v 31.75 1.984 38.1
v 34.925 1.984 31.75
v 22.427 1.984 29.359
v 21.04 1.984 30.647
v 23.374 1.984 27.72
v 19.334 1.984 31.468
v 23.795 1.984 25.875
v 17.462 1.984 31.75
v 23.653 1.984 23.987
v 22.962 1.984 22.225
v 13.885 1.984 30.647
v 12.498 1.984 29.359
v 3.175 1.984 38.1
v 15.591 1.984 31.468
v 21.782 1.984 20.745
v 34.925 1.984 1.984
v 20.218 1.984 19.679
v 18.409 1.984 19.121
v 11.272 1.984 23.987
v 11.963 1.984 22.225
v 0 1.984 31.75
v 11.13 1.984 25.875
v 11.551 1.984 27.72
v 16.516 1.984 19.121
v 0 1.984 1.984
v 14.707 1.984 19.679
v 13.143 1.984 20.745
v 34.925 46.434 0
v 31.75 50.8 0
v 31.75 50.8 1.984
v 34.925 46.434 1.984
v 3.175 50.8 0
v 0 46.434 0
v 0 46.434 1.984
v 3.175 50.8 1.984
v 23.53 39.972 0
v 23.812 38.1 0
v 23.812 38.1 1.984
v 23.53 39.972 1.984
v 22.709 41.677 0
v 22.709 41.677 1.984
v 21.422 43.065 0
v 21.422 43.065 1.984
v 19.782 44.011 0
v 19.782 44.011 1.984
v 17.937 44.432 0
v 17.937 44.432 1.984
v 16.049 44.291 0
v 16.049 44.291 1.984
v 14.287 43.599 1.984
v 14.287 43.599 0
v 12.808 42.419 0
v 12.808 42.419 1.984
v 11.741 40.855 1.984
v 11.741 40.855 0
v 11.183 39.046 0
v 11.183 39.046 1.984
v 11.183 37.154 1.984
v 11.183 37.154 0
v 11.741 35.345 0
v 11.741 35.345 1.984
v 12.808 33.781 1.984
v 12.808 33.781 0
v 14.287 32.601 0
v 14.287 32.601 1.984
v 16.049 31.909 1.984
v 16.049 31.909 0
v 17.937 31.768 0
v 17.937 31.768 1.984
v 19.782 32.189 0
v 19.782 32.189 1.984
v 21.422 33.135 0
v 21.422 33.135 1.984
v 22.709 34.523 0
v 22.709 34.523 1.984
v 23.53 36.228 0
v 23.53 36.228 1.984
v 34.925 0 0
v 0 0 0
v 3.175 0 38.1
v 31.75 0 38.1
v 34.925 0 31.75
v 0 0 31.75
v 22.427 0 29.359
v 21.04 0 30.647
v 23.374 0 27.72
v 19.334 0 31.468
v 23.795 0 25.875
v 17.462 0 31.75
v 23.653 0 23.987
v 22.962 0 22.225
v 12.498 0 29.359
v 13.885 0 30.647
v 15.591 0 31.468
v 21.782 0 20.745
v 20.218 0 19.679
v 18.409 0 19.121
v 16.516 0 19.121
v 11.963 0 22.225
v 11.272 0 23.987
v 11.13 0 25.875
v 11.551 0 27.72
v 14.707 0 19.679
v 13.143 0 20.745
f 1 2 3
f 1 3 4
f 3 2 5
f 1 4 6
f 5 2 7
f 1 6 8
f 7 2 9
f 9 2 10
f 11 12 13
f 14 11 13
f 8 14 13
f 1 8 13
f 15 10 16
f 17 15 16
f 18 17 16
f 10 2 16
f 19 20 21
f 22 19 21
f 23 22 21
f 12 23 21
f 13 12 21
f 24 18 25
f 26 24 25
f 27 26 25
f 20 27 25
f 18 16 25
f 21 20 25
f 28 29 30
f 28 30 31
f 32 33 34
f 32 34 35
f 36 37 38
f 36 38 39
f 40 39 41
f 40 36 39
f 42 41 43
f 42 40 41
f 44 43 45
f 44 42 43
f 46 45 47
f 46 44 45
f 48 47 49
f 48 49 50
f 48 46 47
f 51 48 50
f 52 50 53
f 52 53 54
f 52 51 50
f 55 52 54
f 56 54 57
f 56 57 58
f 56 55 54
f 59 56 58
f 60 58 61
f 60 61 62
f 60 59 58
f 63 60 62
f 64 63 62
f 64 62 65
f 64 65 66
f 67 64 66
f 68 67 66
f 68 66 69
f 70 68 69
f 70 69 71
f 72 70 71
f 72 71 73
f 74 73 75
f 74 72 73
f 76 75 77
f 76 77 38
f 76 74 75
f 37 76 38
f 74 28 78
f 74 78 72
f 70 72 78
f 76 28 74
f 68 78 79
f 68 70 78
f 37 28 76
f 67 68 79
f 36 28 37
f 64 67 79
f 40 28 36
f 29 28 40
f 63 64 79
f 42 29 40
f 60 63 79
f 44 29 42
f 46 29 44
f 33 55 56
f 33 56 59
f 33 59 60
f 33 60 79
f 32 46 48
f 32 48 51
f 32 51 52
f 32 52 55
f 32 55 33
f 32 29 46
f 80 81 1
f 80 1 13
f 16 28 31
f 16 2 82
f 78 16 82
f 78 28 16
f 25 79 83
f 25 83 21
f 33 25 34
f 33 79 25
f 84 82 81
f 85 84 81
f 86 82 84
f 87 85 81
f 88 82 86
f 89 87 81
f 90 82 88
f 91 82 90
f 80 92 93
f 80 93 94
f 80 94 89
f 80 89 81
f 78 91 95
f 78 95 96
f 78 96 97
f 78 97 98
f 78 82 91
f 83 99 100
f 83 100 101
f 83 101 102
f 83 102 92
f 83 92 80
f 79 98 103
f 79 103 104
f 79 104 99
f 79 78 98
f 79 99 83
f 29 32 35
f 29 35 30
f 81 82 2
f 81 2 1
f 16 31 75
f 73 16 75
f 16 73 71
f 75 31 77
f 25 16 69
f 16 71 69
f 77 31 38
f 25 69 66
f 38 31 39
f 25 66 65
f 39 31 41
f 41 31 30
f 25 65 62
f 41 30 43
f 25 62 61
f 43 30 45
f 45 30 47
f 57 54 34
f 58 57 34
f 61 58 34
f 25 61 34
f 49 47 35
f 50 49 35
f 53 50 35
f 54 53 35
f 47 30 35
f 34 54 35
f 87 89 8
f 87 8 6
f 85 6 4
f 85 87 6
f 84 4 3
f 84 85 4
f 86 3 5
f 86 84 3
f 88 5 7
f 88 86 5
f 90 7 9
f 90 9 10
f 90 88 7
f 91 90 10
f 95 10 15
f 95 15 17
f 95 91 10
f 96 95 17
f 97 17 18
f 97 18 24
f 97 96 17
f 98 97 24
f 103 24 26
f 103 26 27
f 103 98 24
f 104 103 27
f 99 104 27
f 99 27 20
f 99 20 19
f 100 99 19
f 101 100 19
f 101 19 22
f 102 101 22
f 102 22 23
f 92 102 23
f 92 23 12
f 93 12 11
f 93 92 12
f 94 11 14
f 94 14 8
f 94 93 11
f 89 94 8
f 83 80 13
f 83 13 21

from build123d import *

# Parameters (mm, degrees)
SKETCH1_R           = 6.35
BOSS_EXTRUDE1_DEPTH = 1.984375
SKETCH2_R           = 6.35
BOSS_EXTRUDE2_DEPTH = 1.984375


with BuildPart() as part:
    # Sketch1 → Boss-Extrude1 (new body)
    with BuildSketch(Plane(origin=(0, 0, 0), x_dir=(1, 0, 0), z_dir=(0, 1, 0))):
        Polygon((0, 0), (34.925, 0), (34.925, -31.75), (31.75, -38.1), (3.175, -38.1), (0, -31.75), align=None)
        with Locations(Location((17.4625, -25.4, 0), (0, 0, 270))):
            Circle(SKETCH1_R, mode=Mode.SUBTRACT)
    extrude(amount=BOSS_EXTRUDE1_DEPTH)

    # Sketch2 → Boss-Extrude2 (add)
    with BuildSketch(Plane.XY):
        Polygon((0, 1.984375), (0, 46.434375), (3.175, 50.8), (31.75, 50.8), (34.925, 46.434375), (34.925, 1.984375), align=None)
        with Locations((17.4625, 38.1)):
            Circle(SKETCH2_R, mode=Mode.SUBTRACT)
    extrude(amount=BOSS_EXTRUDE2_DEPTH)


solid = part.part
